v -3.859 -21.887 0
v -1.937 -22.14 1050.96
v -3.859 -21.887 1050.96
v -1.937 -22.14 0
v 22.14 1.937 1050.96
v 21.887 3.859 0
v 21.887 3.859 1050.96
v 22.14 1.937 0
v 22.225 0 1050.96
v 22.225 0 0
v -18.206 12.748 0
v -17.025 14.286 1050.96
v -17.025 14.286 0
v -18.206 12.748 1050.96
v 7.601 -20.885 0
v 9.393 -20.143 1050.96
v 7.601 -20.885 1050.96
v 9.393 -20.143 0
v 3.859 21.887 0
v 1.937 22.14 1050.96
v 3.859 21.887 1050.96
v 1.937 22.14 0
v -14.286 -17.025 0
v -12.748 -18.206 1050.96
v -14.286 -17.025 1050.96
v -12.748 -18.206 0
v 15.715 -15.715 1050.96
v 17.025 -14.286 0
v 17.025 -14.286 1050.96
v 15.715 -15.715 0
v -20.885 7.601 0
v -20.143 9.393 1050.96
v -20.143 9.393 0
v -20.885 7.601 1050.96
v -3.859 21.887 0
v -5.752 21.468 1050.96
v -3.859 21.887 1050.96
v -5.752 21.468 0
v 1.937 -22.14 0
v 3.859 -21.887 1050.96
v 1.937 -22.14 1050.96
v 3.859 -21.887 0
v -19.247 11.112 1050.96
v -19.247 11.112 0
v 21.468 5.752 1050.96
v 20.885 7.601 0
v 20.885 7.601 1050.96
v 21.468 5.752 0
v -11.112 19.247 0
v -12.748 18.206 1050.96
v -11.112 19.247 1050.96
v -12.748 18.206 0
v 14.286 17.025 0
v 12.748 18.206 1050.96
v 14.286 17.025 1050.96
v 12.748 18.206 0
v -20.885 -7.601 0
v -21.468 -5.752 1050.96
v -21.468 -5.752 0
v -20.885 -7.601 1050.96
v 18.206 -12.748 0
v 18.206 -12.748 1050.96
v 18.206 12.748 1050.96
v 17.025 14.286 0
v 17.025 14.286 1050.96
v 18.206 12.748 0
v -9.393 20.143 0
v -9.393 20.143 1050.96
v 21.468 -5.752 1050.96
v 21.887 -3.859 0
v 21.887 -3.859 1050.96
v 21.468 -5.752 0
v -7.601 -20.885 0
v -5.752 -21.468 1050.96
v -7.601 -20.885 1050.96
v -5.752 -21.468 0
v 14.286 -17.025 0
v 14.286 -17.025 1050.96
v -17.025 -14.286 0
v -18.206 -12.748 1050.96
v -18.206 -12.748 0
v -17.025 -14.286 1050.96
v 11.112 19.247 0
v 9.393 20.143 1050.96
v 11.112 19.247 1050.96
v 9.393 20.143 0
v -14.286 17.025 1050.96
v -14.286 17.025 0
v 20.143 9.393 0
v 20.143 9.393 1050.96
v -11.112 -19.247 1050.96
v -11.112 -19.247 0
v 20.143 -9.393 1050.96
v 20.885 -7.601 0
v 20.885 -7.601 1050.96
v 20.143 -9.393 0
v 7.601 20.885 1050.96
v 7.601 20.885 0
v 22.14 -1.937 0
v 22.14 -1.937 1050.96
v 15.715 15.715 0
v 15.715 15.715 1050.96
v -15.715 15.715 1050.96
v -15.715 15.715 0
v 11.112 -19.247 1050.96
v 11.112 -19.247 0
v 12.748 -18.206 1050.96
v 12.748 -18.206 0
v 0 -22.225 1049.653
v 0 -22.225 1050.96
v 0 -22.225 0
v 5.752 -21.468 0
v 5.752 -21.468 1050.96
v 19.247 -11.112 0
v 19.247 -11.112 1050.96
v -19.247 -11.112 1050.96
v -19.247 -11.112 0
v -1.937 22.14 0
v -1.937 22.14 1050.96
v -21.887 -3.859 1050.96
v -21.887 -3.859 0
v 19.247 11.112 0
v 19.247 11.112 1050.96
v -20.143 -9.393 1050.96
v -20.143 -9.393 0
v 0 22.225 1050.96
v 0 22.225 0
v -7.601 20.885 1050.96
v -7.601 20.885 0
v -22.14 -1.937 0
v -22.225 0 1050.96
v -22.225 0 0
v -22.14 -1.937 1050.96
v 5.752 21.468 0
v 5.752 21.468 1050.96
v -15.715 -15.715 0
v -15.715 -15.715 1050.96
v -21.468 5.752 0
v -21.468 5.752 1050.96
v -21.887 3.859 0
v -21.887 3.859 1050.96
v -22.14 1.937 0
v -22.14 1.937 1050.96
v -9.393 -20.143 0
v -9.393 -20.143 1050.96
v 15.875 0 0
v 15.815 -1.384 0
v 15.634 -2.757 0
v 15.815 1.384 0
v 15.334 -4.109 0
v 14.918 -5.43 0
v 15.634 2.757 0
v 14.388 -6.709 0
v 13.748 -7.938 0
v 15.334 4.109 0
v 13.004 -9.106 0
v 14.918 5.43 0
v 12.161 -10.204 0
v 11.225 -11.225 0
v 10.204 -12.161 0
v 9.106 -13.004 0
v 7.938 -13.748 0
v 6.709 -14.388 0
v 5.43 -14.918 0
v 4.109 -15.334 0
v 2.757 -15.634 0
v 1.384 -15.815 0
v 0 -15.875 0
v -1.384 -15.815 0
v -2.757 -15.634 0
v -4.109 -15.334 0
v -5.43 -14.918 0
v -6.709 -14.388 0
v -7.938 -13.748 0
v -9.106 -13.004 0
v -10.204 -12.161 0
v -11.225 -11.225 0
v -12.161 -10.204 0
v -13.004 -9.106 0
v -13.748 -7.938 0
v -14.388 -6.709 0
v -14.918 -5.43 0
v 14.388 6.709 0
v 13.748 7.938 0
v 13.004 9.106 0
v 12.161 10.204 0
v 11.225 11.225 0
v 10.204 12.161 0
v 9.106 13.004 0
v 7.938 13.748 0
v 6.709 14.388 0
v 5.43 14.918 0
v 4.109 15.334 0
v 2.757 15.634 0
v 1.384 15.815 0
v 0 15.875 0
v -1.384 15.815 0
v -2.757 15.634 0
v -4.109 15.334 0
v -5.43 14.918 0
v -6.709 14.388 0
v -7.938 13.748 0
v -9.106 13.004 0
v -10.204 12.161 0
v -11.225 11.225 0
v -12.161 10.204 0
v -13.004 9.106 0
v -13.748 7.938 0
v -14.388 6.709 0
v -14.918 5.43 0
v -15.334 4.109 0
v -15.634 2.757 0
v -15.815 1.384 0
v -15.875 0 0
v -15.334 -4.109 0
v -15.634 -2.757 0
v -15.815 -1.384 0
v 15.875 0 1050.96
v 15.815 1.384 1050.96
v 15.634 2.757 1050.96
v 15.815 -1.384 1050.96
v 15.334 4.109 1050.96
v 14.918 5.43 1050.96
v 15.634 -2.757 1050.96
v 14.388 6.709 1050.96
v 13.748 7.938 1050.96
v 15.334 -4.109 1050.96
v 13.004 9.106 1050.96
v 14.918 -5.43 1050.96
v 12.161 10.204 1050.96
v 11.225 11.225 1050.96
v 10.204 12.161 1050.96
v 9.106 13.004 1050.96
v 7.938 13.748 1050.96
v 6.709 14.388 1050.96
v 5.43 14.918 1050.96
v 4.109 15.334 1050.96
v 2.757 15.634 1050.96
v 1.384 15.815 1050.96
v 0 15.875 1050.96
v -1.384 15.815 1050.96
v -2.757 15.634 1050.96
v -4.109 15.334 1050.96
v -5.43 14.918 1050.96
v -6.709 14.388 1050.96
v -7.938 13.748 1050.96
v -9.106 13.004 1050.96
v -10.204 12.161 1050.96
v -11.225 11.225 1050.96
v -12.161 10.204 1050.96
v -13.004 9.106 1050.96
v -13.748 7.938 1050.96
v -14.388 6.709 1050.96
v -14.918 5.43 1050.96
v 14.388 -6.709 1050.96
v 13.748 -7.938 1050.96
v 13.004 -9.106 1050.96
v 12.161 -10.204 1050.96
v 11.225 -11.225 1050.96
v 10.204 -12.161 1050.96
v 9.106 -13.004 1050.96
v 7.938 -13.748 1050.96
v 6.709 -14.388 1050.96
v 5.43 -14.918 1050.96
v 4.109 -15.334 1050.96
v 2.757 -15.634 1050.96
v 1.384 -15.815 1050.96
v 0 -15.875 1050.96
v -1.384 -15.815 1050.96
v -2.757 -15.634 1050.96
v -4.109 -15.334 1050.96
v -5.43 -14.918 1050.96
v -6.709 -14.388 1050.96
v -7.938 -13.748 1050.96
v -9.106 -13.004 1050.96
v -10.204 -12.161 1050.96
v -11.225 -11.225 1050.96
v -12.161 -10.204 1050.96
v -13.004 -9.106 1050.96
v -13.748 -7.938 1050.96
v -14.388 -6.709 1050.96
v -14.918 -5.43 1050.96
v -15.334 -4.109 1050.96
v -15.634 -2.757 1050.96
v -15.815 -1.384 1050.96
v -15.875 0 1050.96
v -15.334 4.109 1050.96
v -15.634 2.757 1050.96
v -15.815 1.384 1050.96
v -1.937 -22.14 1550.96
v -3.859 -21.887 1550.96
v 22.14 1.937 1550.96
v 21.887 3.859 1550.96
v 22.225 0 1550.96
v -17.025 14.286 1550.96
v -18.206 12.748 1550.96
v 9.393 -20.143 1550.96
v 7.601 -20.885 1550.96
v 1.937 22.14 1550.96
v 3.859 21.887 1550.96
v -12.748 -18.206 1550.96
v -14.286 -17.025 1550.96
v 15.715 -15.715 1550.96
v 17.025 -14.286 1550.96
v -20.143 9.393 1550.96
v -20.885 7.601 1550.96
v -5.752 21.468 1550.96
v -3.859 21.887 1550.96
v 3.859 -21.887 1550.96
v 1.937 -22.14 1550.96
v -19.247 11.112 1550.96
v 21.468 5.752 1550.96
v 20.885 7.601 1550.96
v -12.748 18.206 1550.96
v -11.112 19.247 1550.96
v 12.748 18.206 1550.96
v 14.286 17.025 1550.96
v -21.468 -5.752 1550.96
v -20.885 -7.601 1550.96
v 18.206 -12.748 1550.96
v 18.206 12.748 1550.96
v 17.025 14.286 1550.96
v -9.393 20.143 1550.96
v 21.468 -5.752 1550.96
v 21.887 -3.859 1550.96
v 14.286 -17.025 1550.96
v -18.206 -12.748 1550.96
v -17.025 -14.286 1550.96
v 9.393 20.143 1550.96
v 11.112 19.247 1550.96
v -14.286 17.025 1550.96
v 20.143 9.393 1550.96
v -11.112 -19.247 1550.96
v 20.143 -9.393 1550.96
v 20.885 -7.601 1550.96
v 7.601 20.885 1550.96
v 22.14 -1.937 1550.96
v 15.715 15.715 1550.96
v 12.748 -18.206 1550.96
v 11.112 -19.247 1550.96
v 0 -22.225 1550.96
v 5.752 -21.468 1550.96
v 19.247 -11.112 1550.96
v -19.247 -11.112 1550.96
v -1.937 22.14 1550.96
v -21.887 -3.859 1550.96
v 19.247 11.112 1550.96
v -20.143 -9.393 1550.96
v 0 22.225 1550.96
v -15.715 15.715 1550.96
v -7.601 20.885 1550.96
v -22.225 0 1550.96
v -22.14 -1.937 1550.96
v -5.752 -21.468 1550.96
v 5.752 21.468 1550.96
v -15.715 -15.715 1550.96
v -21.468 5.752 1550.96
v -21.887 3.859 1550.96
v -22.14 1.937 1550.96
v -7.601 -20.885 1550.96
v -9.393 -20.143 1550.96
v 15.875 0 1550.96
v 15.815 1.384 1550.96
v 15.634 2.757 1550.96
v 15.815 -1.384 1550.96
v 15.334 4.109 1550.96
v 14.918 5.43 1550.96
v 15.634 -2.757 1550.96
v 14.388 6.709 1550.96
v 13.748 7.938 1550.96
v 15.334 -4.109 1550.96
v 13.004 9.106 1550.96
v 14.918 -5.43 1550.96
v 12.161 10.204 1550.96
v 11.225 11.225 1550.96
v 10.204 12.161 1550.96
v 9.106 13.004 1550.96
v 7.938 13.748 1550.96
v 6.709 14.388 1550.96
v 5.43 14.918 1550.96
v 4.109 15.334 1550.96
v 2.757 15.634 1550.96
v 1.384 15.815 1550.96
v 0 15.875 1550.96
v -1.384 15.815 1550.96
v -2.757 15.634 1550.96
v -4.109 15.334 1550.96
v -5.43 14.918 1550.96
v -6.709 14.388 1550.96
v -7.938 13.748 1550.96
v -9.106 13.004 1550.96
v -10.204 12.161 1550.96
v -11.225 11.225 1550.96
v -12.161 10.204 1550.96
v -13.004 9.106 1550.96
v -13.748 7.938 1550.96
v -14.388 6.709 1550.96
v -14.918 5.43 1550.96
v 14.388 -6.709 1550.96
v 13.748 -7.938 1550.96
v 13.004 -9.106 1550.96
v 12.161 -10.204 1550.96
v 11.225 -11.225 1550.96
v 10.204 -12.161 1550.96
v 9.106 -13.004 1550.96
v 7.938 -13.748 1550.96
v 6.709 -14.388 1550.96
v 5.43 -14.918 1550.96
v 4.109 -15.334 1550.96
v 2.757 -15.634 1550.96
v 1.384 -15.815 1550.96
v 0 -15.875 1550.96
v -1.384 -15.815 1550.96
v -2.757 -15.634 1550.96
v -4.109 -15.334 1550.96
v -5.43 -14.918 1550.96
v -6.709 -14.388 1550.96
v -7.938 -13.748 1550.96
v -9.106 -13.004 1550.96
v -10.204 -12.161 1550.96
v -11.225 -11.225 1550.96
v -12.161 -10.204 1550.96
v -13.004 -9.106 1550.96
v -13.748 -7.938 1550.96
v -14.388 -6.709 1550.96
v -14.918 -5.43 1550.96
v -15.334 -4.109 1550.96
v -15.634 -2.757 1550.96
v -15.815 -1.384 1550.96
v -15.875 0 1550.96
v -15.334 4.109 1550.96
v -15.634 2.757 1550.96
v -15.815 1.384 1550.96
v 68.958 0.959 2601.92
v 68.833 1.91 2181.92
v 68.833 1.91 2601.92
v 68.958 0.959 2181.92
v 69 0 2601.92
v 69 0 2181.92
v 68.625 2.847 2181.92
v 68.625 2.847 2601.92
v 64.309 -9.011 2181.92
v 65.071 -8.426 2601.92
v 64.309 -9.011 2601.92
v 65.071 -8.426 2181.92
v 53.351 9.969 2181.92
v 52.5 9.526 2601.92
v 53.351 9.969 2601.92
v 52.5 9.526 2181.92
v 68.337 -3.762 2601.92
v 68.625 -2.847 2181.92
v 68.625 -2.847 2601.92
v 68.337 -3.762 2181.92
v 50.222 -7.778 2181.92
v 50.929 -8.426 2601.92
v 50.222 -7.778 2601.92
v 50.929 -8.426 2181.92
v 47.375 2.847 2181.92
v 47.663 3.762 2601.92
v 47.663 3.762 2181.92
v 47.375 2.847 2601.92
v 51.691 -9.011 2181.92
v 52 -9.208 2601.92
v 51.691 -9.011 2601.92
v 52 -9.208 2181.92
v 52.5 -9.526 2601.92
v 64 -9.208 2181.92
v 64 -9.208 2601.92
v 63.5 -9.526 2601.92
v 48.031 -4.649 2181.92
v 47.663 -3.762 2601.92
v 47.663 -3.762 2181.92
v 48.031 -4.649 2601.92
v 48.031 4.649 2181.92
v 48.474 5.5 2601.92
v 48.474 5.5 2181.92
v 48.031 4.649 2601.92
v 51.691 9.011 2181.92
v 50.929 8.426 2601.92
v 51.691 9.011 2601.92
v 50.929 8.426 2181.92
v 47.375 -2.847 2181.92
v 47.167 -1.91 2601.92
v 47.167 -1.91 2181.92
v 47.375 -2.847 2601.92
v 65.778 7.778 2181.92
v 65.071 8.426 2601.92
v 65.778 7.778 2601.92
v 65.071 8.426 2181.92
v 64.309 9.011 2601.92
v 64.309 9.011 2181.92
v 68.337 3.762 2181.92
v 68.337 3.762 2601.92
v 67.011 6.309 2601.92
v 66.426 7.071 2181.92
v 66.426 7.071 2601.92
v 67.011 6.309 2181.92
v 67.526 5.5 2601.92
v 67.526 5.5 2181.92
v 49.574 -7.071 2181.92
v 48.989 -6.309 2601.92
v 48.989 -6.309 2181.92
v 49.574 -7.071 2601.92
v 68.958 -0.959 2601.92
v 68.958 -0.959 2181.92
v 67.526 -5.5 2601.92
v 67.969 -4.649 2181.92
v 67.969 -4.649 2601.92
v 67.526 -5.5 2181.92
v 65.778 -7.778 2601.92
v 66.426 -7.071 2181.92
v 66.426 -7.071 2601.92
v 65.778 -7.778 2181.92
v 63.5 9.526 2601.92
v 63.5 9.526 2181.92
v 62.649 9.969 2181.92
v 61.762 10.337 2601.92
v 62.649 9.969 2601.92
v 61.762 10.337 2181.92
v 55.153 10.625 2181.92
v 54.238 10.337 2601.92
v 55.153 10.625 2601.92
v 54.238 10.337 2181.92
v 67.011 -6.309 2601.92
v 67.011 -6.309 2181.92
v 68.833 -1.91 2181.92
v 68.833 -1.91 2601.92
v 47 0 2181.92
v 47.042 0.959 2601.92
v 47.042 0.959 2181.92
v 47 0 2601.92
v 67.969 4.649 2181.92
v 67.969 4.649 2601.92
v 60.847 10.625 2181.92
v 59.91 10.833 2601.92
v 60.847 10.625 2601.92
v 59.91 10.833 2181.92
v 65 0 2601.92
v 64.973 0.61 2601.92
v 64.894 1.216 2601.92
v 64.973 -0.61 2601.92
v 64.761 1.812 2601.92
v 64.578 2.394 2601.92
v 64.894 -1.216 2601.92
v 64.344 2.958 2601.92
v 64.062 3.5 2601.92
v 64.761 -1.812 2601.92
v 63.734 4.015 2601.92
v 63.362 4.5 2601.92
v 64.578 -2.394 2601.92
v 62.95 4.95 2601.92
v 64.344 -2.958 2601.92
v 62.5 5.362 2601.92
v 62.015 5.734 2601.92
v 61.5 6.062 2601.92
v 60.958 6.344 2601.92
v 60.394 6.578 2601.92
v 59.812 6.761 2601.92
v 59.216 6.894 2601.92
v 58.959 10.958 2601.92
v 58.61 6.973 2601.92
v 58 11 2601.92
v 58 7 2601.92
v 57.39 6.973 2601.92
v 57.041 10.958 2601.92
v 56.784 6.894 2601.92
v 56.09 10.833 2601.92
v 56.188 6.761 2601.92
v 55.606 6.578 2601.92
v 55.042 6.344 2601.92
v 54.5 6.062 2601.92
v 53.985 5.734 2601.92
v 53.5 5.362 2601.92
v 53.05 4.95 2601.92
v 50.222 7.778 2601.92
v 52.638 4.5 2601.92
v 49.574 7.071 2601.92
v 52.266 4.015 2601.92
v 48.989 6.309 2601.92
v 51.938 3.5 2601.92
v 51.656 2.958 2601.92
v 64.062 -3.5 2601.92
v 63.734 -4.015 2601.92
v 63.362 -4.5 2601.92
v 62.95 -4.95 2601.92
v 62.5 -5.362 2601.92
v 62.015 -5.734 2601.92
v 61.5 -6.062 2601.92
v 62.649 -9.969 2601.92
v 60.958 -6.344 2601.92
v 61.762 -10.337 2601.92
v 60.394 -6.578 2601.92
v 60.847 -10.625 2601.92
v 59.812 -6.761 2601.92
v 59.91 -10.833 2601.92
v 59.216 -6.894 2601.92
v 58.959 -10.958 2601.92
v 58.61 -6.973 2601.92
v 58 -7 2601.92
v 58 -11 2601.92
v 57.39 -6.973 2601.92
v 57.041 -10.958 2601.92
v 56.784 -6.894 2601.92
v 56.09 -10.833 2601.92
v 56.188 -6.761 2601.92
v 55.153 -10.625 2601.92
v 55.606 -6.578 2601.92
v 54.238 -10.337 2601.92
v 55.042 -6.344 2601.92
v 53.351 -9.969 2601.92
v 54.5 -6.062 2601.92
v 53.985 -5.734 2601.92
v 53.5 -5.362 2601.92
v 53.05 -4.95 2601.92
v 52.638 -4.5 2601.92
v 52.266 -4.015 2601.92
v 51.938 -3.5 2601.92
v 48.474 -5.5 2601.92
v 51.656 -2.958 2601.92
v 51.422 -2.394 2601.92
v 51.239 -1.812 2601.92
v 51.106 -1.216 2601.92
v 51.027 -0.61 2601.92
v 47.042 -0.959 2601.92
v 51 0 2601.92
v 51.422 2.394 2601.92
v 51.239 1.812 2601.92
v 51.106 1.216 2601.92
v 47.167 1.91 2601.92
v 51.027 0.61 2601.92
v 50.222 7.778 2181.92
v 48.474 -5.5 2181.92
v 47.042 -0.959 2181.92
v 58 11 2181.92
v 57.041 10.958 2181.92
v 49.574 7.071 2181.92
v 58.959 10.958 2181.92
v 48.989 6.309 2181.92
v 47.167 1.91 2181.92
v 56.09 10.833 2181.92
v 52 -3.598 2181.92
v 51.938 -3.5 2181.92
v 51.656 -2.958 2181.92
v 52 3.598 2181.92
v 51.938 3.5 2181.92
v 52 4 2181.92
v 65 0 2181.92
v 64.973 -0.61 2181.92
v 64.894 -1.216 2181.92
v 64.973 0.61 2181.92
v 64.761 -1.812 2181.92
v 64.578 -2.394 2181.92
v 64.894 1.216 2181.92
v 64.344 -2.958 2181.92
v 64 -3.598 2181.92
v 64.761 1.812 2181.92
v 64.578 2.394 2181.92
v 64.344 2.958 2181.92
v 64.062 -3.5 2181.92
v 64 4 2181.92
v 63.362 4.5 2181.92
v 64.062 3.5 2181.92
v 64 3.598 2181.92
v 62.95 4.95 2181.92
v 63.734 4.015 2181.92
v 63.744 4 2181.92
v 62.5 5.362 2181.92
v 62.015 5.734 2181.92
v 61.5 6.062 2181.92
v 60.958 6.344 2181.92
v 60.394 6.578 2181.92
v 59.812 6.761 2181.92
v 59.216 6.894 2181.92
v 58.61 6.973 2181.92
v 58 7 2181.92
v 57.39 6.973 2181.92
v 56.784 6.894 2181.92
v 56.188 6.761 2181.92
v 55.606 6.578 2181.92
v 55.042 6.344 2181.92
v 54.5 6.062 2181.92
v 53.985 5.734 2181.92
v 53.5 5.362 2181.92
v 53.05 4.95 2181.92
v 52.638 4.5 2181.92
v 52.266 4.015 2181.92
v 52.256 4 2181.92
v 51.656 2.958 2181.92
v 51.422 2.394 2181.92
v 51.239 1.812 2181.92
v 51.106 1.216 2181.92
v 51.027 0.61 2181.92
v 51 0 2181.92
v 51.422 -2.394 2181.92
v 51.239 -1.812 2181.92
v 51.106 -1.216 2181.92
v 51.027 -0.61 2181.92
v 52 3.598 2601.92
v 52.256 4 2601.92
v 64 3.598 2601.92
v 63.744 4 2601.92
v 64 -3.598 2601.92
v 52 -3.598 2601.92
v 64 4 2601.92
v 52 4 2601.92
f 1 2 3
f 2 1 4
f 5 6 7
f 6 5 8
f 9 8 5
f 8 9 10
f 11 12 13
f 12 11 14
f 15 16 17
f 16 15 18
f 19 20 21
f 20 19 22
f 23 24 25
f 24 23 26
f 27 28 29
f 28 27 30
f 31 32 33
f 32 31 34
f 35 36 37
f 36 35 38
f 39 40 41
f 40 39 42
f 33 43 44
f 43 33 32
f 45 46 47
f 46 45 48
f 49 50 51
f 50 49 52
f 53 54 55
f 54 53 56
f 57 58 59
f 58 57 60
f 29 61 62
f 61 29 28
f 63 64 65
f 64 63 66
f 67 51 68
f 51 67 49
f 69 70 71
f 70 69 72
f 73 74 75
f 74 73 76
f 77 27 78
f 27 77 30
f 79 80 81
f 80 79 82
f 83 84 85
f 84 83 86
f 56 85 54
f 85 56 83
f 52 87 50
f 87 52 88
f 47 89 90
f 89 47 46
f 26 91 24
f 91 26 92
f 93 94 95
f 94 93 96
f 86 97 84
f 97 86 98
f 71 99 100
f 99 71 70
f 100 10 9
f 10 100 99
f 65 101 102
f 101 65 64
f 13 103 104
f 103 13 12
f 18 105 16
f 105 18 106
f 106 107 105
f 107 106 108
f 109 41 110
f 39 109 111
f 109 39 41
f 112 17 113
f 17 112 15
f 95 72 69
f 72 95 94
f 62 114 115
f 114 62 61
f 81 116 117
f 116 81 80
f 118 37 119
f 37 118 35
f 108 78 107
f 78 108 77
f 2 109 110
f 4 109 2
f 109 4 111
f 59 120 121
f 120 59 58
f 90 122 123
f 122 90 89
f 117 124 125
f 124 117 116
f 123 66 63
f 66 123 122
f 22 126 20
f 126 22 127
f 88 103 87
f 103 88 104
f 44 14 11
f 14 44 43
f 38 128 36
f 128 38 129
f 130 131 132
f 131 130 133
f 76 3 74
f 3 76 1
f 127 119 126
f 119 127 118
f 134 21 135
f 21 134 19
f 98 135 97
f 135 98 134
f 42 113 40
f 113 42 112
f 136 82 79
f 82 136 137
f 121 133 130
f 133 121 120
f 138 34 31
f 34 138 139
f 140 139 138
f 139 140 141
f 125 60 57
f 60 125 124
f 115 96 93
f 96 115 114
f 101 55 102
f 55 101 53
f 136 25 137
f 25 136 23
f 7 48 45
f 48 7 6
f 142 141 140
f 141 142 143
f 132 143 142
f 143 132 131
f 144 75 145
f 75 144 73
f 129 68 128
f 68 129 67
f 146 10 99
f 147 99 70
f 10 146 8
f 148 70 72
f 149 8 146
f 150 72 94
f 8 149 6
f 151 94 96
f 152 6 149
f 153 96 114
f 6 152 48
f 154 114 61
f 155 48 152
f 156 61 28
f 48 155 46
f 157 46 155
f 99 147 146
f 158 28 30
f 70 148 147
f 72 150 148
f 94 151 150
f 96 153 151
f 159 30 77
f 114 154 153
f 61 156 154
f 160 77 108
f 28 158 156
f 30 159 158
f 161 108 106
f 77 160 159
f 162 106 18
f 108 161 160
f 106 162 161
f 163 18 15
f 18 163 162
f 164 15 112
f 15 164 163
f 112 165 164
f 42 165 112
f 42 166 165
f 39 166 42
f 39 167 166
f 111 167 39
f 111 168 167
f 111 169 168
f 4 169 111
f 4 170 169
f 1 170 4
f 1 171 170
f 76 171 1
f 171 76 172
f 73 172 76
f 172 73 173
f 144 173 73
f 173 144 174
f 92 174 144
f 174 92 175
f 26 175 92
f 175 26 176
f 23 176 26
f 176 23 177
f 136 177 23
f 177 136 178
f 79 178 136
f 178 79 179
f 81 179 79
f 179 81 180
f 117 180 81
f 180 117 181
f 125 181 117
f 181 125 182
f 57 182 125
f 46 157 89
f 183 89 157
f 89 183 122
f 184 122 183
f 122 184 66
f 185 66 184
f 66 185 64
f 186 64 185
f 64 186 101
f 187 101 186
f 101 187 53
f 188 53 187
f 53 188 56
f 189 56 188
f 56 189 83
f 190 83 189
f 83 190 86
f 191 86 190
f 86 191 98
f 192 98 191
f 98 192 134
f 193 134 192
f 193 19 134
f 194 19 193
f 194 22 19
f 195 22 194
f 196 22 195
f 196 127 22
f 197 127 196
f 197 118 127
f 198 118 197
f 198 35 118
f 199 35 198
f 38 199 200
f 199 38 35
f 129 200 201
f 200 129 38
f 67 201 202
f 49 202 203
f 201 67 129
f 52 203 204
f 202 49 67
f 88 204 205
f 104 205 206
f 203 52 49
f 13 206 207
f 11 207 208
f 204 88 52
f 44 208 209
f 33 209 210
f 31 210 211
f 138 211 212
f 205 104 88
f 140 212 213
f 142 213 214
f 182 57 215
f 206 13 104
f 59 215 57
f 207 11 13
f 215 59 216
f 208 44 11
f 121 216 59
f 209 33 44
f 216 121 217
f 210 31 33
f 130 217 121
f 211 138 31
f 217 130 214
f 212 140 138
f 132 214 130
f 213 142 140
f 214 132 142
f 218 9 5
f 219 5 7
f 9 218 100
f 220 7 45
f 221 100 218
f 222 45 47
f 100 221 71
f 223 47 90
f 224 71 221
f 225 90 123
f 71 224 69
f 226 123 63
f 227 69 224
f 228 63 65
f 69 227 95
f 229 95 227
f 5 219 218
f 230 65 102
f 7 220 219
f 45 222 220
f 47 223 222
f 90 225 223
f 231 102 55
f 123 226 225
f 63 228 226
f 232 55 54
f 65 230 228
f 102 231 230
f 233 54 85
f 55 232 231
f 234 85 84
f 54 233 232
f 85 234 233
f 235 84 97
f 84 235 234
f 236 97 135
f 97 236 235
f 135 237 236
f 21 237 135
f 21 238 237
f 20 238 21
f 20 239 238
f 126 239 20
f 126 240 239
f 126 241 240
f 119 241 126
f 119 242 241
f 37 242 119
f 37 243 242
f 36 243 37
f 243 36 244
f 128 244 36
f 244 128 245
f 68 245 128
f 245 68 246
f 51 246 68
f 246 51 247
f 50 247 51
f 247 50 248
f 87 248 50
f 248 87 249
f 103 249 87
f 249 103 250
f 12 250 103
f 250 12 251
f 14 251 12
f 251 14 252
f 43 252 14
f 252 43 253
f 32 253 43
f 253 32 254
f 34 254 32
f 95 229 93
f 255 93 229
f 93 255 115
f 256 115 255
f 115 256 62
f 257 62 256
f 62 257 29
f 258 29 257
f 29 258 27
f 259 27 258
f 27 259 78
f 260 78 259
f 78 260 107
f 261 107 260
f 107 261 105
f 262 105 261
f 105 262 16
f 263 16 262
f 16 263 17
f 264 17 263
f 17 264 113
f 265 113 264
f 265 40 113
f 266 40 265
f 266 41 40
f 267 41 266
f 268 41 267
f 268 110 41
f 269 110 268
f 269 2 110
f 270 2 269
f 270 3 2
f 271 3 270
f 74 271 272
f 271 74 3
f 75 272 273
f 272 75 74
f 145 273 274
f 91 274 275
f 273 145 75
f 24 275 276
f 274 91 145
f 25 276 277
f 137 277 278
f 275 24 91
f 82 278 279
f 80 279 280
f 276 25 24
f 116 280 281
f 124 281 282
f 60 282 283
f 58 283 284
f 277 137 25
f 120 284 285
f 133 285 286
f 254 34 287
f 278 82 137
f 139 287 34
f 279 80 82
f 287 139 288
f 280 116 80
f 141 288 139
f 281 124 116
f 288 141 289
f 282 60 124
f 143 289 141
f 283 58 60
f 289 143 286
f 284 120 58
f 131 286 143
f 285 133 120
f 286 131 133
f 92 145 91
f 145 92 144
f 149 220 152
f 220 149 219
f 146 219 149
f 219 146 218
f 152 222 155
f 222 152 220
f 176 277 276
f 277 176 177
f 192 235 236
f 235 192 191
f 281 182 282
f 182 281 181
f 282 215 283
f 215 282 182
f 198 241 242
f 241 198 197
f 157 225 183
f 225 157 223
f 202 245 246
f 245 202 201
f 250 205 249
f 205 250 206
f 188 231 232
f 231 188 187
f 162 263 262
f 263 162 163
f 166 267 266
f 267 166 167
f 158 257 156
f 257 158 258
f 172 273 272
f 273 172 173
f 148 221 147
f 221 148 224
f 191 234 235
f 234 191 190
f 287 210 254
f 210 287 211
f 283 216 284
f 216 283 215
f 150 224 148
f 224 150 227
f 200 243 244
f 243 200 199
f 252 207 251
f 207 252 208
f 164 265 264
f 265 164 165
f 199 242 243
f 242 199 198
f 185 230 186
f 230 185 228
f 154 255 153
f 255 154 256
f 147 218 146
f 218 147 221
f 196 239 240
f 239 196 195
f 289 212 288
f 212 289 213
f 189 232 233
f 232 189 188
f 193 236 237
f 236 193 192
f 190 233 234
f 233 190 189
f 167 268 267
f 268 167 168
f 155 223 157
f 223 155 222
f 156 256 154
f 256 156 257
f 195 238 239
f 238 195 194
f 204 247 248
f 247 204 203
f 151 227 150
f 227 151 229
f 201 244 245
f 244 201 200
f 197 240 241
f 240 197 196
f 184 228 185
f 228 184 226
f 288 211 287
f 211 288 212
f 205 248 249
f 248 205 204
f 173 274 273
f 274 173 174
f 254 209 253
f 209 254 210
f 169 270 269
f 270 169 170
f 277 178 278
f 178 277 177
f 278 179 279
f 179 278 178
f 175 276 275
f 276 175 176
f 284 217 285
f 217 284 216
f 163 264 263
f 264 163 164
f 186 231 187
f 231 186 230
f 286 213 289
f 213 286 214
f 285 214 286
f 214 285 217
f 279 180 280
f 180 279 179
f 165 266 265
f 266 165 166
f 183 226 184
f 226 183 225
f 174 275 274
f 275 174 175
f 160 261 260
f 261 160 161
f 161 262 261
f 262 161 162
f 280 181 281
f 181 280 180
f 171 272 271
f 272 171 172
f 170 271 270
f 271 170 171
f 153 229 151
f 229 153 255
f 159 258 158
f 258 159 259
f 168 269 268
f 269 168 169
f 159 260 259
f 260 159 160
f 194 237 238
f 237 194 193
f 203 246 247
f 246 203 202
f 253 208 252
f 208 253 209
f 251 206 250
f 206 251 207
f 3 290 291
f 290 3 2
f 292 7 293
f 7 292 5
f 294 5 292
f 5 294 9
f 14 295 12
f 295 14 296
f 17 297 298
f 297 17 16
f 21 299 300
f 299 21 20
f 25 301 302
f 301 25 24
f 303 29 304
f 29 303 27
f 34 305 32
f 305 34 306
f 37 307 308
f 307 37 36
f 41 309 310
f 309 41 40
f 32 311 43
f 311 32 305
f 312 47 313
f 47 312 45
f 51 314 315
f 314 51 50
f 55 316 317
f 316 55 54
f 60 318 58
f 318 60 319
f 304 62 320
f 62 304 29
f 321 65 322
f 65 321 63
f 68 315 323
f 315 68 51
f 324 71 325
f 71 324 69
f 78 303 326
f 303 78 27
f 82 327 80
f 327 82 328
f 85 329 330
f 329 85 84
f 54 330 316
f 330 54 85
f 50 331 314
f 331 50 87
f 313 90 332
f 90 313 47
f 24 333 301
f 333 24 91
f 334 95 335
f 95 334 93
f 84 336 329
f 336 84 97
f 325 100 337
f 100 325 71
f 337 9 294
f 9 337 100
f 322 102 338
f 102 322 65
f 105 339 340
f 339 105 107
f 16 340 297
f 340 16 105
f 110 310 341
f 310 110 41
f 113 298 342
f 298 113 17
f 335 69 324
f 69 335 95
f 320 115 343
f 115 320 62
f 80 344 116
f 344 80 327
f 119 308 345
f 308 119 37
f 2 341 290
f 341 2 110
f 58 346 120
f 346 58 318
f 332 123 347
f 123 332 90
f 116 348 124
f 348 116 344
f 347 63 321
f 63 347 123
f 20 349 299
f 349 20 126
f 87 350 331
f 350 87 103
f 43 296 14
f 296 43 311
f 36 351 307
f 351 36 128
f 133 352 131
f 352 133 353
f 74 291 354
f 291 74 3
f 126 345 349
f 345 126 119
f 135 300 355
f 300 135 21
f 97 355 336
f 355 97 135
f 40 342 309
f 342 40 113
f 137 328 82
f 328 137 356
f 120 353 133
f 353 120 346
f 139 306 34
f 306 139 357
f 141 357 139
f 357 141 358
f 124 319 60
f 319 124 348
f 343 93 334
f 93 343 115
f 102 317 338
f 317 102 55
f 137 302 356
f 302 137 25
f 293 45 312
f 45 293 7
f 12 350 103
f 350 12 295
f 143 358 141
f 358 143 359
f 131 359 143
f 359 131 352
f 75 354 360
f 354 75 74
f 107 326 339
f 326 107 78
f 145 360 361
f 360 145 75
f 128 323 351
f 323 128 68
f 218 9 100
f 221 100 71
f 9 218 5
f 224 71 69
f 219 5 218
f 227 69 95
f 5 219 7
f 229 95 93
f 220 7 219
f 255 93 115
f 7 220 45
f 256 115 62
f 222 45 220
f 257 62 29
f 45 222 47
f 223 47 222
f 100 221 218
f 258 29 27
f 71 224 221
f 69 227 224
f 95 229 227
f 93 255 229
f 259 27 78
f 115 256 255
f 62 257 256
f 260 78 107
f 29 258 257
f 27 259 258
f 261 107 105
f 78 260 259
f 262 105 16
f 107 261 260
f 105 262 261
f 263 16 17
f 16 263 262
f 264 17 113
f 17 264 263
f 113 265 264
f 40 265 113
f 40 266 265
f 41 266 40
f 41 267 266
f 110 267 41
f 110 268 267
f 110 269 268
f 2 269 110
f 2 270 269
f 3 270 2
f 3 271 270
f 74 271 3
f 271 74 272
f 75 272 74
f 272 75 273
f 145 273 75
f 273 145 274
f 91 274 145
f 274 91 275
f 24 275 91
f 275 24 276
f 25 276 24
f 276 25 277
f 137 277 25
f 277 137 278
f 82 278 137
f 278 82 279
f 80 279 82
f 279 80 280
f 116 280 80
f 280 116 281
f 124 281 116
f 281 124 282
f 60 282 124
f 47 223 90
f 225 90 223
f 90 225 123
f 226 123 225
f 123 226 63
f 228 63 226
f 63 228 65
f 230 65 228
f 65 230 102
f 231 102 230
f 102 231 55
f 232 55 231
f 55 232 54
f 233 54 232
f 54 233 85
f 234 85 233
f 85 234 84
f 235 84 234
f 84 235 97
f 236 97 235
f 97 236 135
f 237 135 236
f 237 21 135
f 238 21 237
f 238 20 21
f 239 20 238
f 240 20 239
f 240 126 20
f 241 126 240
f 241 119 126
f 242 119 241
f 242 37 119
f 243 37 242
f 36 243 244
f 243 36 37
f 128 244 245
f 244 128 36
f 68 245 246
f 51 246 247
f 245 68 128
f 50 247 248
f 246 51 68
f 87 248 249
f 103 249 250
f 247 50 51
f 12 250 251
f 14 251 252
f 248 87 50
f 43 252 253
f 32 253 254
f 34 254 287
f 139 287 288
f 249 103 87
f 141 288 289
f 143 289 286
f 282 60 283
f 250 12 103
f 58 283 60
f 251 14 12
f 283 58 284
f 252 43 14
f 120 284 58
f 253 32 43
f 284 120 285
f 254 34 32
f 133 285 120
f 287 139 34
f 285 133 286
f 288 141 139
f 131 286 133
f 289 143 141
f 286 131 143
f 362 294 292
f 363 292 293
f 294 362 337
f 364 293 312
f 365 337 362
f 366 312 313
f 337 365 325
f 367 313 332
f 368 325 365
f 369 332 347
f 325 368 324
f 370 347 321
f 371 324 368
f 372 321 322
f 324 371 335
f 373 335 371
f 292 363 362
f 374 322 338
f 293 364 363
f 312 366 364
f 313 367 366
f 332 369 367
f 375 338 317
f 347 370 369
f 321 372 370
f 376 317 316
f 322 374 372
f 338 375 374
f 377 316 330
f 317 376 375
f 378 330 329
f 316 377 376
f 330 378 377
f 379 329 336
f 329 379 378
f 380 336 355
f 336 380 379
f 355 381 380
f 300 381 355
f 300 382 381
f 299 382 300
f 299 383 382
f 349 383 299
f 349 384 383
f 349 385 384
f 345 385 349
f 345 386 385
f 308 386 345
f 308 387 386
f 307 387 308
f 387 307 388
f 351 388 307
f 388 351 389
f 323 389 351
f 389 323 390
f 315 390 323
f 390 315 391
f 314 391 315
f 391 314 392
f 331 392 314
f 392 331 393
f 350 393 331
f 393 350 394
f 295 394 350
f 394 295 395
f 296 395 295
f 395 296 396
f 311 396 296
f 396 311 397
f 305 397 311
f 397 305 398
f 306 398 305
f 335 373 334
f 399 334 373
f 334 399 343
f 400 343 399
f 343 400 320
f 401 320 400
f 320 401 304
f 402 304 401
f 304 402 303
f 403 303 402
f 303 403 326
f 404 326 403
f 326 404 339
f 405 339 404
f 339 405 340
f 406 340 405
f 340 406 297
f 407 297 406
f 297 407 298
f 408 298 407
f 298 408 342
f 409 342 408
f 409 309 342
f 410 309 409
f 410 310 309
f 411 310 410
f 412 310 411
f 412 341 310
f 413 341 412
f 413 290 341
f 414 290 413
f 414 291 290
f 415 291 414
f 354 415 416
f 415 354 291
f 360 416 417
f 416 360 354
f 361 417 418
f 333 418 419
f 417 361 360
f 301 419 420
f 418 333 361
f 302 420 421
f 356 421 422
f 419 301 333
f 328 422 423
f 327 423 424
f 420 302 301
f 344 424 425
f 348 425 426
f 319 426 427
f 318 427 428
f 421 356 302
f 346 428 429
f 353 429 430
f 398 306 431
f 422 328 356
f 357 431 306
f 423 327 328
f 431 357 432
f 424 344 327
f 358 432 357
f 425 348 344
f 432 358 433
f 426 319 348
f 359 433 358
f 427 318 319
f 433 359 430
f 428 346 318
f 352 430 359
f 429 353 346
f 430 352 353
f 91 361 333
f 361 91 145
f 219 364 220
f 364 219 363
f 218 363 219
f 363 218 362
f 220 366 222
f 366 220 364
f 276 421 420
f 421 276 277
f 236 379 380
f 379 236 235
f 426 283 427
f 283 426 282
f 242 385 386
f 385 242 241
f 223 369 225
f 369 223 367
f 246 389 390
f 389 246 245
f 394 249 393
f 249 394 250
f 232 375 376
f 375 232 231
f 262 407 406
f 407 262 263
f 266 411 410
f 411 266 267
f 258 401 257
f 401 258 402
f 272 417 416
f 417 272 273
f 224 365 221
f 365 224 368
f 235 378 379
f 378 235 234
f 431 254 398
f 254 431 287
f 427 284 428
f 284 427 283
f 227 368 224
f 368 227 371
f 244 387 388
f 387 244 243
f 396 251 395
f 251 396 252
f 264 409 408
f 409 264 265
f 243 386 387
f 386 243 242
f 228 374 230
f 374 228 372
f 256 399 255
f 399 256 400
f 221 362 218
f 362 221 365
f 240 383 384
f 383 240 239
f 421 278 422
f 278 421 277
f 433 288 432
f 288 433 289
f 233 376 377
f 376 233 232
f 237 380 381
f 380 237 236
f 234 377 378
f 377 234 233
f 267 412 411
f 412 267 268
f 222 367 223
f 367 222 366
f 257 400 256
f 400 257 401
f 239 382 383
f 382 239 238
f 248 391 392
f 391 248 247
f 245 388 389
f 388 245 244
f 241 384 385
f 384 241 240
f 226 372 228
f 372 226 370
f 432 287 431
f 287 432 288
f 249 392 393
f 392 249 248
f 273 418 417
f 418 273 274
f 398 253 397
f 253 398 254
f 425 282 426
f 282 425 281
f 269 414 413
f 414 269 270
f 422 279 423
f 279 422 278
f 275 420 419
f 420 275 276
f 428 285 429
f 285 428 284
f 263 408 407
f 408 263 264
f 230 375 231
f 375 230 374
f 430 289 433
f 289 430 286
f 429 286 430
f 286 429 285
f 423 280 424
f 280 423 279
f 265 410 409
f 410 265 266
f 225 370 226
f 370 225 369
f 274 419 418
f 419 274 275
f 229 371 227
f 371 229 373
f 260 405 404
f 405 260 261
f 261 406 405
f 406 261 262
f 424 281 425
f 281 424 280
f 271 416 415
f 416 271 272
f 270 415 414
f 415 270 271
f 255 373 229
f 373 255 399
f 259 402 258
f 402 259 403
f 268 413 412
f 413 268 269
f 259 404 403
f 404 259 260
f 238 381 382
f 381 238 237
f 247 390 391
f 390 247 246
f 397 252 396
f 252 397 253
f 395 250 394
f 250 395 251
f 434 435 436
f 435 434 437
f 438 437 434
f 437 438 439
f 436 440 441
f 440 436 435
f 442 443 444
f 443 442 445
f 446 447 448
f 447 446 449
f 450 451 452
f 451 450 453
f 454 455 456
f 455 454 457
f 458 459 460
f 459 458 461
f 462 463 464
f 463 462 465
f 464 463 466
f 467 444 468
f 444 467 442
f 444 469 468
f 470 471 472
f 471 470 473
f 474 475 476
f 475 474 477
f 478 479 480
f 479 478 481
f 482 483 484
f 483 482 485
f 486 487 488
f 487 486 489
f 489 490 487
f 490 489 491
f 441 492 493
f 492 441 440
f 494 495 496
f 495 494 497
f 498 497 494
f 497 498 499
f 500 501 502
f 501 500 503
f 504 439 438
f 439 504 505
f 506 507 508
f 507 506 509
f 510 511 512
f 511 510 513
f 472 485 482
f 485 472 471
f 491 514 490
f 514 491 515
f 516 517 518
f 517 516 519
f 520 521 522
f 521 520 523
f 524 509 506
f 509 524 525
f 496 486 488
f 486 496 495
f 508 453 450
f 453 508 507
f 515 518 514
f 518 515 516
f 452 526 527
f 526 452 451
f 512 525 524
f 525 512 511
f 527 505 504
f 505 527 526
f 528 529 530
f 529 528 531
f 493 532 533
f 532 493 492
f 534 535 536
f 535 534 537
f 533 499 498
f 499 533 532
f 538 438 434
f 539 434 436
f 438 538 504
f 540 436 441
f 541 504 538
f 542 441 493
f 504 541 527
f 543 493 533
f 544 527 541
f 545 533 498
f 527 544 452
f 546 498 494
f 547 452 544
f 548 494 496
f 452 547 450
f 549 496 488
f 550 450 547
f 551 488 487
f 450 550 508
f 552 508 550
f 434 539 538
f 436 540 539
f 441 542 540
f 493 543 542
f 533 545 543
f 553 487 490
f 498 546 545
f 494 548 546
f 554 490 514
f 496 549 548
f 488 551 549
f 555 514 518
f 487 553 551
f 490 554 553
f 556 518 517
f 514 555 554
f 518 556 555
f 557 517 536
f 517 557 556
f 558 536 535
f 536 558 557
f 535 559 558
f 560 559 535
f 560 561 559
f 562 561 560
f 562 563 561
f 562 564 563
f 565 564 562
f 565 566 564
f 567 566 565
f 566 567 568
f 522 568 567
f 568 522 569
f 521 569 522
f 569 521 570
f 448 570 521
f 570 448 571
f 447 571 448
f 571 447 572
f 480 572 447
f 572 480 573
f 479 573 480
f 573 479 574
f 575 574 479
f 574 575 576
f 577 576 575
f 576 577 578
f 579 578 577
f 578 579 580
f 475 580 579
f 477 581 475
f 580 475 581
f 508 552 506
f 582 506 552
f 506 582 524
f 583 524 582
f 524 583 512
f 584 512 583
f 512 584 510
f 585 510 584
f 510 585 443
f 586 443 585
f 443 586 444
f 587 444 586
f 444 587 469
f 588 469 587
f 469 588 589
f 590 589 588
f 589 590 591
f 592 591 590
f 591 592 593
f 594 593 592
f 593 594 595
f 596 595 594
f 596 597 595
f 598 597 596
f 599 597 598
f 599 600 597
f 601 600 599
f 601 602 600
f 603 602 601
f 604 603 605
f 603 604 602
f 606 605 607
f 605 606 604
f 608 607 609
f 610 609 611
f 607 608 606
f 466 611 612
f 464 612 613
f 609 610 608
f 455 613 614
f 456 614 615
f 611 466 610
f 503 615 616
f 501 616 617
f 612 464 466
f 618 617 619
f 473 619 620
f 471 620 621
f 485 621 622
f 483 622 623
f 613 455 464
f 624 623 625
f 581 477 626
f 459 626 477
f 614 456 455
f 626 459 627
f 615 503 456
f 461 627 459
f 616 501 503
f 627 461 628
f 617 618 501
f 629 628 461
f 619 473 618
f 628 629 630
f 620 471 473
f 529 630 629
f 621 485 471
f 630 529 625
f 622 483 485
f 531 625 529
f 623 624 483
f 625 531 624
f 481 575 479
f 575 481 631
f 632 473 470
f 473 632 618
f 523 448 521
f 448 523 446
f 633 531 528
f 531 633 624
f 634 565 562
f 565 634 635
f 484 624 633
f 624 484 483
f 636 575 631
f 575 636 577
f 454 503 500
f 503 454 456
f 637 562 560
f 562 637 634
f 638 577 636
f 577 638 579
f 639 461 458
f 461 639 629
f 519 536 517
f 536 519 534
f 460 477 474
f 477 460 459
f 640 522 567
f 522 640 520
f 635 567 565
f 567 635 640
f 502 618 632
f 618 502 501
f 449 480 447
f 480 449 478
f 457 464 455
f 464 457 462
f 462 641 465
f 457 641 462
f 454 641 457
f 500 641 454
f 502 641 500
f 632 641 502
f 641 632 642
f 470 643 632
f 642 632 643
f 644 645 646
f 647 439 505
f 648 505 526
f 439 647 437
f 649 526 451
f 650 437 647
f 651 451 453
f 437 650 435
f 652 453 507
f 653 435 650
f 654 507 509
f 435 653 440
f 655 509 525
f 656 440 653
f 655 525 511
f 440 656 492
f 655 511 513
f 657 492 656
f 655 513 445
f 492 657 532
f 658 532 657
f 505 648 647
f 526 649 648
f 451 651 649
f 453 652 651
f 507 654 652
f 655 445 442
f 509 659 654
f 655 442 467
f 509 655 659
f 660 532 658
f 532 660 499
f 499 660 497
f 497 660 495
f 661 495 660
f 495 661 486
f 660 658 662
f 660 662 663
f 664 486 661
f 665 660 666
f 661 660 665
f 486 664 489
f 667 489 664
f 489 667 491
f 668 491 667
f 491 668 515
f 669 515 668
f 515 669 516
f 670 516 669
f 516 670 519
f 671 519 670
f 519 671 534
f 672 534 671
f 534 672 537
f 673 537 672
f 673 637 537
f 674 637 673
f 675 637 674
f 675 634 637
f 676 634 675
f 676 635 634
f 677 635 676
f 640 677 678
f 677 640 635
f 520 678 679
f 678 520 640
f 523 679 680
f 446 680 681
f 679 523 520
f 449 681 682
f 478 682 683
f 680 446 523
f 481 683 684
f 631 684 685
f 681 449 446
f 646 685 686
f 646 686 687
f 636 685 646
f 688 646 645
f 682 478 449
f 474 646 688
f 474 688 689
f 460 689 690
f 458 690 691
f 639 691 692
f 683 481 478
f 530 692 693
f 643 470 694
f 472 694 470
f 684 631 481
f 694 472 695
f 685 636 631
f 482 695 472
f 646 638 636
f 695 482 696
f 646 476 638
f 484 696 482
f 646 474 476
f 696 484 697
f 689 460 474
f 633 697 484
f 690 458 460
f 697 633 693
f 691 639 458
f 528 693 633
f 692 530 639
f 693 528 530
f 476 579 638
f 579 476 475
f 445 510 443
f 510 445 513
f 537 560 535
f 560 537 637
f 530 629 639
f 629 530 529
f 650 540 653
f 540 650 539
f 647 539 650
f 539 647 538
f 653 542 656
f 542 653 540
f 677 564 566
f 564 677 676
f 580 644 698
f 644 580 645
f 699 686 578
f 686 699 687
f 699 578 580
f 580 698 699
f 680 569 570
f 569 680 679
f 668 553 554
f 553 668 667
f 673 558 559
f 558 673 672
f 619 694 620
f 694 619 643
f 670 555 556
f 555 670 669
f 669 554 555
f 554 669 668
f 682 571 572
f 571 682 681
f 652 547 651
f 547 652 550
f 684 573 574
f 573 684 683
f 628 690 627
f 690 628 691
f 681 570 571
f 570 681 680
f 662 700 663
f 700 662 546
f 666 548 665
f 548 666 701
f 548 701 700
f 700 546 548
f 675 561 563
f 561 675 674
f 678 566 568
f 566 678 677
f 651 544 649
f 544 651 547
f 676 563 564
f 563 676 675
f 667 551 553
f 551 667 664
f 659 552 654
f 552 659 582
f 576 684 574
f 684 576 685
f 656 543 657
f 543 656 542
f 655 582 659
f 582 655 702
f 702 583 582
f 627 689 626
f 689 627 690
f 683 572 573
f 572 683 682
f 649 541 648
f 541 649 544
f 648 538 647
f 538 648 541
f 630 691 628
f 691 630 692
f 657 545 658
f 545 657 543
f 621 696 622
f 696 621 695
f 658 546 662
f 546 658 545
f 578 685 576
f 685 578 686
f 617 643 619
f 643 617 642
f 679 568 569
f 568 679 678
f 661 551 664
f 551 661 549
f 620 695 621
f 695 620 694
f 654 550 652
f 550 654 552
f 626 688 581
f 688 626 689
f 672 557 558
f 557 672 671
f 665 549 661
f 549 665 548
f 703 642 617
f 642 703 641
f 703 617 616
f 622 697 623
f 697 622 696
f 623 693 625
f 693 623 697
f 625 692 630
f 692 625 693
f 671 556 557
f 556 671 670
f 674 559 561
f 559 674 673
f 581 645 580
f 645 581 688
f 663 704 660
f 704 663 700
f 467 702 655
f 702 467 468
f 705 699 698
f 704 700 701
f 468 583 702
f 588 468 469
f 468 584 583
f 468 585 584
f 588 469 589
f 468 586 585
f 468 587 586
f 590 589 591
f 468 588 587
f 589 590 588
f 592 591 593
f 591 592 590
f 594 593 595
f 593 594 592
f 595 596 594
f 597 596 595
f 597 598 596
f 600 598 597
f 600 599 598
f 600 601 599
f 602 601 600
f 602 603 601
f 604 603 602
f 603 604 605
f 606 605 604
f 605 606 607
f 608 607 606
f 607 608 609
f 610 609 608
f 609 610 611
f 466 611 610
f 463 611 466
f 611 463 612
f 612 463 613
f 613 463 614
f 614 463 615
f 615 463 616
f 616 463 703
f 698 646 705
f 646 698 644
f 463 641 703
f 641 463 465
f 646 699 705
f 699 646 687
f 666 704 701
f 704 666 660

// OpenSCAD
// Fujara — Monolithic Body Variant (CAD/fujara-body-monolithic/)
// Issue #2: integrate Flue_Top voicing geometry into Body_Top + Body_Bottom.
//
// This variant keeps the original fujara.scad assembly as the default.
// The monolithic version eliminates the separate Flue_Top glue joint by
// cutting the flue windway, sound window, and labium edge directly into
// Body_Top. Body_Bottom is the lower bore continuation.
//
// Fabrication authority status: PENDING_MEASUREMENT.
// Verify all dimensions against design-table/fujara-dimensions-parametric.xlsx
// and family-spec.csv before any machining.
// See CAD/mcp-session-log.md for V5 provenance.

$fn = 72;

// ── Parameters (from family-spec.csv FUJ-A2-STUDY + design-table) ────────────

target_note       = "A2";
target_hz         = 110.00;

main_bore_length_mm  = 1550.96;   // open-open effective length seed
main_bore_id_mm      = 31.75;     // bore ID from design table
wall_thickness_mm    = 6.35;
outer_dia_mm         = main_bore_id_mm + 2 * wall_thickness_mm;

// Tone holes (position from foot end — traditional 0.83/0.73/0.68 ratios).
hole1_from_foot_mm = main_bore_length_mm * 0.83;
hole2_from_foot_mm = main_bore_length_mm * 0.73;
hole3_from_foot_mm = main_bore_length_mm * 0.68;
hole_diameter_mm   = 10;

// ── Body_Top / Body_Bottom split point ───────────────────────────────────────
// The joint sits just below the voicing zone so both pieces are manageable
// on a lathe. Adjust split_z to match your blank/lathe capacity.
split_z_mm = main_bore_length_mm - 500;  // starter value; measurement-required

// ── Monolithic flue geometry (integrated into Body_Top) ──────────────────────
// In the separate-part assembly these lived in Fujara_Flue_Top.
// Here they are cut directly into the top section.
flue_width_mm           = 12.0;   // windway width — measurement-required
flue_depth_mm           = 4.0;    // windway height — measurement-required
sound_window_length_mm  = 30.0;   // labium opening along bore axis — measurement-required
sound_window_width_mm   = 16.0;   // labium opening across bore — measurement-required
labium_angle_deg        = 35;     // splitting-edge angle from horizontal — measurement-required

// Side air tube (unchanged from fujara.scad reference design).
side_tube_center_offset_mm = 58;
side_tube_od_mm            = 22;
side_tube_id_mm            = 14;
side_tube_length_mm        = 420;

// ── Modules ──────────────────────────────────────────────────────────────────

module bore_shell(len_mm) {
  difference() {
    cylinder(h = len_mm, d = outer_dia_mm);
    translate([0, 0, -1]) cylinder(h = len_mm + 2, d = main_bore_id_mm);
  }
}

module tone_hole(z_pos) {
  translate([0, -outer_dia_mm / 2, z_pos])
    rotate([90, 0, 0])
      cylinder(h = outer_dia_mm + 2, d = hole_diameter_mm);
}

// Integrated flue windway cut into the body wall at the top.
// The windway runs axially through the wall from the side-tube inlet port
// to the sound window opening.
module flue_windway() {
  translate([side_tube_center_offset_mm - flue_width_mm / 2,
             -outer_dia_mm / 2,
             main_bore_length_mm - side_tube_length_mm - flue_depth_mm])
    cube([flue_width_mm, outer_dia_mm / 2 + flue_depth_mm, side_tube_length_mm + flue_depth_mm]);
}

// Sound window opening through the bore wall.
module sound_window() {
  translate([-sound_window_width_mm / 2,
             -outer_dia_mm / 2 - 1,
             main_bore_length_mm - side_tube_length_mm - sound_window_length_mm])
    cube([sound_window_width_mm, wall_thickness_mm + 2, sound_window_length_mm]);
}

// Labium (splitting edge) — angled face at the top of the sound window.
// Modelled as a rotated wedge; refine angle after P0 voicing tests.
module labium_edge() {
  translate([0, -outer_dia_mm / 2, main_bore_length_mm - side_tube_length_mm])
    rotate([labium_angle_deg, 0, 0])
      cube([sound_window_width_mm, 2, wall_thickness_mm], center = true);
}

module side_air_tube() {
  translate([side_tube_center_offset_mm, 0,
             main_bore_length_mm - side_tube_length_mm])
    difference() {
      cylinder(h = side_tube_length_mm, d = side_tube_od_mm);
      translate([0, 0, -1]) cylinder(h = side_tube_length_mm + 2, d = side_tube_id_mm);
    }
}

// ── Body_Top: upper bore section with integrated flue/voicing geometry ────────
module body_top() {
  top_len = main_bore_length_mm - split_z_mm;
  translate([0, 0, split_z_mm])
    difference() {
      union() {
        bore_shell(top_len);
        side_air_tube();
      }
      flue_windway();
      sound_window();
    }
}

// ── Body_Bottom: lower bore continuation with tone holes ─────────────────────
module body_bottom() {
  difference() {
    bore_shell(split_z_mm);
    tone_hole(hole1_from_foot_mm);
    tone_hole(hole2_from_foot_mm);
    tone_hole(hole3_from_foot_mm);
  }
}

// ── Assembly ─────────────────────────────────────────────────────────────────
// Render Body_Top + Body_Bottom together for visual review.
// Change SHOW_TOP / SHOW_BOTTOM to isolate pieces for machining review.

SHOW_TOP    = true;
SHOW_BOTTOM = true;

if (SHOW_BOTTOM) body_bottom();
if (SHOW_TOP)    body_top();
